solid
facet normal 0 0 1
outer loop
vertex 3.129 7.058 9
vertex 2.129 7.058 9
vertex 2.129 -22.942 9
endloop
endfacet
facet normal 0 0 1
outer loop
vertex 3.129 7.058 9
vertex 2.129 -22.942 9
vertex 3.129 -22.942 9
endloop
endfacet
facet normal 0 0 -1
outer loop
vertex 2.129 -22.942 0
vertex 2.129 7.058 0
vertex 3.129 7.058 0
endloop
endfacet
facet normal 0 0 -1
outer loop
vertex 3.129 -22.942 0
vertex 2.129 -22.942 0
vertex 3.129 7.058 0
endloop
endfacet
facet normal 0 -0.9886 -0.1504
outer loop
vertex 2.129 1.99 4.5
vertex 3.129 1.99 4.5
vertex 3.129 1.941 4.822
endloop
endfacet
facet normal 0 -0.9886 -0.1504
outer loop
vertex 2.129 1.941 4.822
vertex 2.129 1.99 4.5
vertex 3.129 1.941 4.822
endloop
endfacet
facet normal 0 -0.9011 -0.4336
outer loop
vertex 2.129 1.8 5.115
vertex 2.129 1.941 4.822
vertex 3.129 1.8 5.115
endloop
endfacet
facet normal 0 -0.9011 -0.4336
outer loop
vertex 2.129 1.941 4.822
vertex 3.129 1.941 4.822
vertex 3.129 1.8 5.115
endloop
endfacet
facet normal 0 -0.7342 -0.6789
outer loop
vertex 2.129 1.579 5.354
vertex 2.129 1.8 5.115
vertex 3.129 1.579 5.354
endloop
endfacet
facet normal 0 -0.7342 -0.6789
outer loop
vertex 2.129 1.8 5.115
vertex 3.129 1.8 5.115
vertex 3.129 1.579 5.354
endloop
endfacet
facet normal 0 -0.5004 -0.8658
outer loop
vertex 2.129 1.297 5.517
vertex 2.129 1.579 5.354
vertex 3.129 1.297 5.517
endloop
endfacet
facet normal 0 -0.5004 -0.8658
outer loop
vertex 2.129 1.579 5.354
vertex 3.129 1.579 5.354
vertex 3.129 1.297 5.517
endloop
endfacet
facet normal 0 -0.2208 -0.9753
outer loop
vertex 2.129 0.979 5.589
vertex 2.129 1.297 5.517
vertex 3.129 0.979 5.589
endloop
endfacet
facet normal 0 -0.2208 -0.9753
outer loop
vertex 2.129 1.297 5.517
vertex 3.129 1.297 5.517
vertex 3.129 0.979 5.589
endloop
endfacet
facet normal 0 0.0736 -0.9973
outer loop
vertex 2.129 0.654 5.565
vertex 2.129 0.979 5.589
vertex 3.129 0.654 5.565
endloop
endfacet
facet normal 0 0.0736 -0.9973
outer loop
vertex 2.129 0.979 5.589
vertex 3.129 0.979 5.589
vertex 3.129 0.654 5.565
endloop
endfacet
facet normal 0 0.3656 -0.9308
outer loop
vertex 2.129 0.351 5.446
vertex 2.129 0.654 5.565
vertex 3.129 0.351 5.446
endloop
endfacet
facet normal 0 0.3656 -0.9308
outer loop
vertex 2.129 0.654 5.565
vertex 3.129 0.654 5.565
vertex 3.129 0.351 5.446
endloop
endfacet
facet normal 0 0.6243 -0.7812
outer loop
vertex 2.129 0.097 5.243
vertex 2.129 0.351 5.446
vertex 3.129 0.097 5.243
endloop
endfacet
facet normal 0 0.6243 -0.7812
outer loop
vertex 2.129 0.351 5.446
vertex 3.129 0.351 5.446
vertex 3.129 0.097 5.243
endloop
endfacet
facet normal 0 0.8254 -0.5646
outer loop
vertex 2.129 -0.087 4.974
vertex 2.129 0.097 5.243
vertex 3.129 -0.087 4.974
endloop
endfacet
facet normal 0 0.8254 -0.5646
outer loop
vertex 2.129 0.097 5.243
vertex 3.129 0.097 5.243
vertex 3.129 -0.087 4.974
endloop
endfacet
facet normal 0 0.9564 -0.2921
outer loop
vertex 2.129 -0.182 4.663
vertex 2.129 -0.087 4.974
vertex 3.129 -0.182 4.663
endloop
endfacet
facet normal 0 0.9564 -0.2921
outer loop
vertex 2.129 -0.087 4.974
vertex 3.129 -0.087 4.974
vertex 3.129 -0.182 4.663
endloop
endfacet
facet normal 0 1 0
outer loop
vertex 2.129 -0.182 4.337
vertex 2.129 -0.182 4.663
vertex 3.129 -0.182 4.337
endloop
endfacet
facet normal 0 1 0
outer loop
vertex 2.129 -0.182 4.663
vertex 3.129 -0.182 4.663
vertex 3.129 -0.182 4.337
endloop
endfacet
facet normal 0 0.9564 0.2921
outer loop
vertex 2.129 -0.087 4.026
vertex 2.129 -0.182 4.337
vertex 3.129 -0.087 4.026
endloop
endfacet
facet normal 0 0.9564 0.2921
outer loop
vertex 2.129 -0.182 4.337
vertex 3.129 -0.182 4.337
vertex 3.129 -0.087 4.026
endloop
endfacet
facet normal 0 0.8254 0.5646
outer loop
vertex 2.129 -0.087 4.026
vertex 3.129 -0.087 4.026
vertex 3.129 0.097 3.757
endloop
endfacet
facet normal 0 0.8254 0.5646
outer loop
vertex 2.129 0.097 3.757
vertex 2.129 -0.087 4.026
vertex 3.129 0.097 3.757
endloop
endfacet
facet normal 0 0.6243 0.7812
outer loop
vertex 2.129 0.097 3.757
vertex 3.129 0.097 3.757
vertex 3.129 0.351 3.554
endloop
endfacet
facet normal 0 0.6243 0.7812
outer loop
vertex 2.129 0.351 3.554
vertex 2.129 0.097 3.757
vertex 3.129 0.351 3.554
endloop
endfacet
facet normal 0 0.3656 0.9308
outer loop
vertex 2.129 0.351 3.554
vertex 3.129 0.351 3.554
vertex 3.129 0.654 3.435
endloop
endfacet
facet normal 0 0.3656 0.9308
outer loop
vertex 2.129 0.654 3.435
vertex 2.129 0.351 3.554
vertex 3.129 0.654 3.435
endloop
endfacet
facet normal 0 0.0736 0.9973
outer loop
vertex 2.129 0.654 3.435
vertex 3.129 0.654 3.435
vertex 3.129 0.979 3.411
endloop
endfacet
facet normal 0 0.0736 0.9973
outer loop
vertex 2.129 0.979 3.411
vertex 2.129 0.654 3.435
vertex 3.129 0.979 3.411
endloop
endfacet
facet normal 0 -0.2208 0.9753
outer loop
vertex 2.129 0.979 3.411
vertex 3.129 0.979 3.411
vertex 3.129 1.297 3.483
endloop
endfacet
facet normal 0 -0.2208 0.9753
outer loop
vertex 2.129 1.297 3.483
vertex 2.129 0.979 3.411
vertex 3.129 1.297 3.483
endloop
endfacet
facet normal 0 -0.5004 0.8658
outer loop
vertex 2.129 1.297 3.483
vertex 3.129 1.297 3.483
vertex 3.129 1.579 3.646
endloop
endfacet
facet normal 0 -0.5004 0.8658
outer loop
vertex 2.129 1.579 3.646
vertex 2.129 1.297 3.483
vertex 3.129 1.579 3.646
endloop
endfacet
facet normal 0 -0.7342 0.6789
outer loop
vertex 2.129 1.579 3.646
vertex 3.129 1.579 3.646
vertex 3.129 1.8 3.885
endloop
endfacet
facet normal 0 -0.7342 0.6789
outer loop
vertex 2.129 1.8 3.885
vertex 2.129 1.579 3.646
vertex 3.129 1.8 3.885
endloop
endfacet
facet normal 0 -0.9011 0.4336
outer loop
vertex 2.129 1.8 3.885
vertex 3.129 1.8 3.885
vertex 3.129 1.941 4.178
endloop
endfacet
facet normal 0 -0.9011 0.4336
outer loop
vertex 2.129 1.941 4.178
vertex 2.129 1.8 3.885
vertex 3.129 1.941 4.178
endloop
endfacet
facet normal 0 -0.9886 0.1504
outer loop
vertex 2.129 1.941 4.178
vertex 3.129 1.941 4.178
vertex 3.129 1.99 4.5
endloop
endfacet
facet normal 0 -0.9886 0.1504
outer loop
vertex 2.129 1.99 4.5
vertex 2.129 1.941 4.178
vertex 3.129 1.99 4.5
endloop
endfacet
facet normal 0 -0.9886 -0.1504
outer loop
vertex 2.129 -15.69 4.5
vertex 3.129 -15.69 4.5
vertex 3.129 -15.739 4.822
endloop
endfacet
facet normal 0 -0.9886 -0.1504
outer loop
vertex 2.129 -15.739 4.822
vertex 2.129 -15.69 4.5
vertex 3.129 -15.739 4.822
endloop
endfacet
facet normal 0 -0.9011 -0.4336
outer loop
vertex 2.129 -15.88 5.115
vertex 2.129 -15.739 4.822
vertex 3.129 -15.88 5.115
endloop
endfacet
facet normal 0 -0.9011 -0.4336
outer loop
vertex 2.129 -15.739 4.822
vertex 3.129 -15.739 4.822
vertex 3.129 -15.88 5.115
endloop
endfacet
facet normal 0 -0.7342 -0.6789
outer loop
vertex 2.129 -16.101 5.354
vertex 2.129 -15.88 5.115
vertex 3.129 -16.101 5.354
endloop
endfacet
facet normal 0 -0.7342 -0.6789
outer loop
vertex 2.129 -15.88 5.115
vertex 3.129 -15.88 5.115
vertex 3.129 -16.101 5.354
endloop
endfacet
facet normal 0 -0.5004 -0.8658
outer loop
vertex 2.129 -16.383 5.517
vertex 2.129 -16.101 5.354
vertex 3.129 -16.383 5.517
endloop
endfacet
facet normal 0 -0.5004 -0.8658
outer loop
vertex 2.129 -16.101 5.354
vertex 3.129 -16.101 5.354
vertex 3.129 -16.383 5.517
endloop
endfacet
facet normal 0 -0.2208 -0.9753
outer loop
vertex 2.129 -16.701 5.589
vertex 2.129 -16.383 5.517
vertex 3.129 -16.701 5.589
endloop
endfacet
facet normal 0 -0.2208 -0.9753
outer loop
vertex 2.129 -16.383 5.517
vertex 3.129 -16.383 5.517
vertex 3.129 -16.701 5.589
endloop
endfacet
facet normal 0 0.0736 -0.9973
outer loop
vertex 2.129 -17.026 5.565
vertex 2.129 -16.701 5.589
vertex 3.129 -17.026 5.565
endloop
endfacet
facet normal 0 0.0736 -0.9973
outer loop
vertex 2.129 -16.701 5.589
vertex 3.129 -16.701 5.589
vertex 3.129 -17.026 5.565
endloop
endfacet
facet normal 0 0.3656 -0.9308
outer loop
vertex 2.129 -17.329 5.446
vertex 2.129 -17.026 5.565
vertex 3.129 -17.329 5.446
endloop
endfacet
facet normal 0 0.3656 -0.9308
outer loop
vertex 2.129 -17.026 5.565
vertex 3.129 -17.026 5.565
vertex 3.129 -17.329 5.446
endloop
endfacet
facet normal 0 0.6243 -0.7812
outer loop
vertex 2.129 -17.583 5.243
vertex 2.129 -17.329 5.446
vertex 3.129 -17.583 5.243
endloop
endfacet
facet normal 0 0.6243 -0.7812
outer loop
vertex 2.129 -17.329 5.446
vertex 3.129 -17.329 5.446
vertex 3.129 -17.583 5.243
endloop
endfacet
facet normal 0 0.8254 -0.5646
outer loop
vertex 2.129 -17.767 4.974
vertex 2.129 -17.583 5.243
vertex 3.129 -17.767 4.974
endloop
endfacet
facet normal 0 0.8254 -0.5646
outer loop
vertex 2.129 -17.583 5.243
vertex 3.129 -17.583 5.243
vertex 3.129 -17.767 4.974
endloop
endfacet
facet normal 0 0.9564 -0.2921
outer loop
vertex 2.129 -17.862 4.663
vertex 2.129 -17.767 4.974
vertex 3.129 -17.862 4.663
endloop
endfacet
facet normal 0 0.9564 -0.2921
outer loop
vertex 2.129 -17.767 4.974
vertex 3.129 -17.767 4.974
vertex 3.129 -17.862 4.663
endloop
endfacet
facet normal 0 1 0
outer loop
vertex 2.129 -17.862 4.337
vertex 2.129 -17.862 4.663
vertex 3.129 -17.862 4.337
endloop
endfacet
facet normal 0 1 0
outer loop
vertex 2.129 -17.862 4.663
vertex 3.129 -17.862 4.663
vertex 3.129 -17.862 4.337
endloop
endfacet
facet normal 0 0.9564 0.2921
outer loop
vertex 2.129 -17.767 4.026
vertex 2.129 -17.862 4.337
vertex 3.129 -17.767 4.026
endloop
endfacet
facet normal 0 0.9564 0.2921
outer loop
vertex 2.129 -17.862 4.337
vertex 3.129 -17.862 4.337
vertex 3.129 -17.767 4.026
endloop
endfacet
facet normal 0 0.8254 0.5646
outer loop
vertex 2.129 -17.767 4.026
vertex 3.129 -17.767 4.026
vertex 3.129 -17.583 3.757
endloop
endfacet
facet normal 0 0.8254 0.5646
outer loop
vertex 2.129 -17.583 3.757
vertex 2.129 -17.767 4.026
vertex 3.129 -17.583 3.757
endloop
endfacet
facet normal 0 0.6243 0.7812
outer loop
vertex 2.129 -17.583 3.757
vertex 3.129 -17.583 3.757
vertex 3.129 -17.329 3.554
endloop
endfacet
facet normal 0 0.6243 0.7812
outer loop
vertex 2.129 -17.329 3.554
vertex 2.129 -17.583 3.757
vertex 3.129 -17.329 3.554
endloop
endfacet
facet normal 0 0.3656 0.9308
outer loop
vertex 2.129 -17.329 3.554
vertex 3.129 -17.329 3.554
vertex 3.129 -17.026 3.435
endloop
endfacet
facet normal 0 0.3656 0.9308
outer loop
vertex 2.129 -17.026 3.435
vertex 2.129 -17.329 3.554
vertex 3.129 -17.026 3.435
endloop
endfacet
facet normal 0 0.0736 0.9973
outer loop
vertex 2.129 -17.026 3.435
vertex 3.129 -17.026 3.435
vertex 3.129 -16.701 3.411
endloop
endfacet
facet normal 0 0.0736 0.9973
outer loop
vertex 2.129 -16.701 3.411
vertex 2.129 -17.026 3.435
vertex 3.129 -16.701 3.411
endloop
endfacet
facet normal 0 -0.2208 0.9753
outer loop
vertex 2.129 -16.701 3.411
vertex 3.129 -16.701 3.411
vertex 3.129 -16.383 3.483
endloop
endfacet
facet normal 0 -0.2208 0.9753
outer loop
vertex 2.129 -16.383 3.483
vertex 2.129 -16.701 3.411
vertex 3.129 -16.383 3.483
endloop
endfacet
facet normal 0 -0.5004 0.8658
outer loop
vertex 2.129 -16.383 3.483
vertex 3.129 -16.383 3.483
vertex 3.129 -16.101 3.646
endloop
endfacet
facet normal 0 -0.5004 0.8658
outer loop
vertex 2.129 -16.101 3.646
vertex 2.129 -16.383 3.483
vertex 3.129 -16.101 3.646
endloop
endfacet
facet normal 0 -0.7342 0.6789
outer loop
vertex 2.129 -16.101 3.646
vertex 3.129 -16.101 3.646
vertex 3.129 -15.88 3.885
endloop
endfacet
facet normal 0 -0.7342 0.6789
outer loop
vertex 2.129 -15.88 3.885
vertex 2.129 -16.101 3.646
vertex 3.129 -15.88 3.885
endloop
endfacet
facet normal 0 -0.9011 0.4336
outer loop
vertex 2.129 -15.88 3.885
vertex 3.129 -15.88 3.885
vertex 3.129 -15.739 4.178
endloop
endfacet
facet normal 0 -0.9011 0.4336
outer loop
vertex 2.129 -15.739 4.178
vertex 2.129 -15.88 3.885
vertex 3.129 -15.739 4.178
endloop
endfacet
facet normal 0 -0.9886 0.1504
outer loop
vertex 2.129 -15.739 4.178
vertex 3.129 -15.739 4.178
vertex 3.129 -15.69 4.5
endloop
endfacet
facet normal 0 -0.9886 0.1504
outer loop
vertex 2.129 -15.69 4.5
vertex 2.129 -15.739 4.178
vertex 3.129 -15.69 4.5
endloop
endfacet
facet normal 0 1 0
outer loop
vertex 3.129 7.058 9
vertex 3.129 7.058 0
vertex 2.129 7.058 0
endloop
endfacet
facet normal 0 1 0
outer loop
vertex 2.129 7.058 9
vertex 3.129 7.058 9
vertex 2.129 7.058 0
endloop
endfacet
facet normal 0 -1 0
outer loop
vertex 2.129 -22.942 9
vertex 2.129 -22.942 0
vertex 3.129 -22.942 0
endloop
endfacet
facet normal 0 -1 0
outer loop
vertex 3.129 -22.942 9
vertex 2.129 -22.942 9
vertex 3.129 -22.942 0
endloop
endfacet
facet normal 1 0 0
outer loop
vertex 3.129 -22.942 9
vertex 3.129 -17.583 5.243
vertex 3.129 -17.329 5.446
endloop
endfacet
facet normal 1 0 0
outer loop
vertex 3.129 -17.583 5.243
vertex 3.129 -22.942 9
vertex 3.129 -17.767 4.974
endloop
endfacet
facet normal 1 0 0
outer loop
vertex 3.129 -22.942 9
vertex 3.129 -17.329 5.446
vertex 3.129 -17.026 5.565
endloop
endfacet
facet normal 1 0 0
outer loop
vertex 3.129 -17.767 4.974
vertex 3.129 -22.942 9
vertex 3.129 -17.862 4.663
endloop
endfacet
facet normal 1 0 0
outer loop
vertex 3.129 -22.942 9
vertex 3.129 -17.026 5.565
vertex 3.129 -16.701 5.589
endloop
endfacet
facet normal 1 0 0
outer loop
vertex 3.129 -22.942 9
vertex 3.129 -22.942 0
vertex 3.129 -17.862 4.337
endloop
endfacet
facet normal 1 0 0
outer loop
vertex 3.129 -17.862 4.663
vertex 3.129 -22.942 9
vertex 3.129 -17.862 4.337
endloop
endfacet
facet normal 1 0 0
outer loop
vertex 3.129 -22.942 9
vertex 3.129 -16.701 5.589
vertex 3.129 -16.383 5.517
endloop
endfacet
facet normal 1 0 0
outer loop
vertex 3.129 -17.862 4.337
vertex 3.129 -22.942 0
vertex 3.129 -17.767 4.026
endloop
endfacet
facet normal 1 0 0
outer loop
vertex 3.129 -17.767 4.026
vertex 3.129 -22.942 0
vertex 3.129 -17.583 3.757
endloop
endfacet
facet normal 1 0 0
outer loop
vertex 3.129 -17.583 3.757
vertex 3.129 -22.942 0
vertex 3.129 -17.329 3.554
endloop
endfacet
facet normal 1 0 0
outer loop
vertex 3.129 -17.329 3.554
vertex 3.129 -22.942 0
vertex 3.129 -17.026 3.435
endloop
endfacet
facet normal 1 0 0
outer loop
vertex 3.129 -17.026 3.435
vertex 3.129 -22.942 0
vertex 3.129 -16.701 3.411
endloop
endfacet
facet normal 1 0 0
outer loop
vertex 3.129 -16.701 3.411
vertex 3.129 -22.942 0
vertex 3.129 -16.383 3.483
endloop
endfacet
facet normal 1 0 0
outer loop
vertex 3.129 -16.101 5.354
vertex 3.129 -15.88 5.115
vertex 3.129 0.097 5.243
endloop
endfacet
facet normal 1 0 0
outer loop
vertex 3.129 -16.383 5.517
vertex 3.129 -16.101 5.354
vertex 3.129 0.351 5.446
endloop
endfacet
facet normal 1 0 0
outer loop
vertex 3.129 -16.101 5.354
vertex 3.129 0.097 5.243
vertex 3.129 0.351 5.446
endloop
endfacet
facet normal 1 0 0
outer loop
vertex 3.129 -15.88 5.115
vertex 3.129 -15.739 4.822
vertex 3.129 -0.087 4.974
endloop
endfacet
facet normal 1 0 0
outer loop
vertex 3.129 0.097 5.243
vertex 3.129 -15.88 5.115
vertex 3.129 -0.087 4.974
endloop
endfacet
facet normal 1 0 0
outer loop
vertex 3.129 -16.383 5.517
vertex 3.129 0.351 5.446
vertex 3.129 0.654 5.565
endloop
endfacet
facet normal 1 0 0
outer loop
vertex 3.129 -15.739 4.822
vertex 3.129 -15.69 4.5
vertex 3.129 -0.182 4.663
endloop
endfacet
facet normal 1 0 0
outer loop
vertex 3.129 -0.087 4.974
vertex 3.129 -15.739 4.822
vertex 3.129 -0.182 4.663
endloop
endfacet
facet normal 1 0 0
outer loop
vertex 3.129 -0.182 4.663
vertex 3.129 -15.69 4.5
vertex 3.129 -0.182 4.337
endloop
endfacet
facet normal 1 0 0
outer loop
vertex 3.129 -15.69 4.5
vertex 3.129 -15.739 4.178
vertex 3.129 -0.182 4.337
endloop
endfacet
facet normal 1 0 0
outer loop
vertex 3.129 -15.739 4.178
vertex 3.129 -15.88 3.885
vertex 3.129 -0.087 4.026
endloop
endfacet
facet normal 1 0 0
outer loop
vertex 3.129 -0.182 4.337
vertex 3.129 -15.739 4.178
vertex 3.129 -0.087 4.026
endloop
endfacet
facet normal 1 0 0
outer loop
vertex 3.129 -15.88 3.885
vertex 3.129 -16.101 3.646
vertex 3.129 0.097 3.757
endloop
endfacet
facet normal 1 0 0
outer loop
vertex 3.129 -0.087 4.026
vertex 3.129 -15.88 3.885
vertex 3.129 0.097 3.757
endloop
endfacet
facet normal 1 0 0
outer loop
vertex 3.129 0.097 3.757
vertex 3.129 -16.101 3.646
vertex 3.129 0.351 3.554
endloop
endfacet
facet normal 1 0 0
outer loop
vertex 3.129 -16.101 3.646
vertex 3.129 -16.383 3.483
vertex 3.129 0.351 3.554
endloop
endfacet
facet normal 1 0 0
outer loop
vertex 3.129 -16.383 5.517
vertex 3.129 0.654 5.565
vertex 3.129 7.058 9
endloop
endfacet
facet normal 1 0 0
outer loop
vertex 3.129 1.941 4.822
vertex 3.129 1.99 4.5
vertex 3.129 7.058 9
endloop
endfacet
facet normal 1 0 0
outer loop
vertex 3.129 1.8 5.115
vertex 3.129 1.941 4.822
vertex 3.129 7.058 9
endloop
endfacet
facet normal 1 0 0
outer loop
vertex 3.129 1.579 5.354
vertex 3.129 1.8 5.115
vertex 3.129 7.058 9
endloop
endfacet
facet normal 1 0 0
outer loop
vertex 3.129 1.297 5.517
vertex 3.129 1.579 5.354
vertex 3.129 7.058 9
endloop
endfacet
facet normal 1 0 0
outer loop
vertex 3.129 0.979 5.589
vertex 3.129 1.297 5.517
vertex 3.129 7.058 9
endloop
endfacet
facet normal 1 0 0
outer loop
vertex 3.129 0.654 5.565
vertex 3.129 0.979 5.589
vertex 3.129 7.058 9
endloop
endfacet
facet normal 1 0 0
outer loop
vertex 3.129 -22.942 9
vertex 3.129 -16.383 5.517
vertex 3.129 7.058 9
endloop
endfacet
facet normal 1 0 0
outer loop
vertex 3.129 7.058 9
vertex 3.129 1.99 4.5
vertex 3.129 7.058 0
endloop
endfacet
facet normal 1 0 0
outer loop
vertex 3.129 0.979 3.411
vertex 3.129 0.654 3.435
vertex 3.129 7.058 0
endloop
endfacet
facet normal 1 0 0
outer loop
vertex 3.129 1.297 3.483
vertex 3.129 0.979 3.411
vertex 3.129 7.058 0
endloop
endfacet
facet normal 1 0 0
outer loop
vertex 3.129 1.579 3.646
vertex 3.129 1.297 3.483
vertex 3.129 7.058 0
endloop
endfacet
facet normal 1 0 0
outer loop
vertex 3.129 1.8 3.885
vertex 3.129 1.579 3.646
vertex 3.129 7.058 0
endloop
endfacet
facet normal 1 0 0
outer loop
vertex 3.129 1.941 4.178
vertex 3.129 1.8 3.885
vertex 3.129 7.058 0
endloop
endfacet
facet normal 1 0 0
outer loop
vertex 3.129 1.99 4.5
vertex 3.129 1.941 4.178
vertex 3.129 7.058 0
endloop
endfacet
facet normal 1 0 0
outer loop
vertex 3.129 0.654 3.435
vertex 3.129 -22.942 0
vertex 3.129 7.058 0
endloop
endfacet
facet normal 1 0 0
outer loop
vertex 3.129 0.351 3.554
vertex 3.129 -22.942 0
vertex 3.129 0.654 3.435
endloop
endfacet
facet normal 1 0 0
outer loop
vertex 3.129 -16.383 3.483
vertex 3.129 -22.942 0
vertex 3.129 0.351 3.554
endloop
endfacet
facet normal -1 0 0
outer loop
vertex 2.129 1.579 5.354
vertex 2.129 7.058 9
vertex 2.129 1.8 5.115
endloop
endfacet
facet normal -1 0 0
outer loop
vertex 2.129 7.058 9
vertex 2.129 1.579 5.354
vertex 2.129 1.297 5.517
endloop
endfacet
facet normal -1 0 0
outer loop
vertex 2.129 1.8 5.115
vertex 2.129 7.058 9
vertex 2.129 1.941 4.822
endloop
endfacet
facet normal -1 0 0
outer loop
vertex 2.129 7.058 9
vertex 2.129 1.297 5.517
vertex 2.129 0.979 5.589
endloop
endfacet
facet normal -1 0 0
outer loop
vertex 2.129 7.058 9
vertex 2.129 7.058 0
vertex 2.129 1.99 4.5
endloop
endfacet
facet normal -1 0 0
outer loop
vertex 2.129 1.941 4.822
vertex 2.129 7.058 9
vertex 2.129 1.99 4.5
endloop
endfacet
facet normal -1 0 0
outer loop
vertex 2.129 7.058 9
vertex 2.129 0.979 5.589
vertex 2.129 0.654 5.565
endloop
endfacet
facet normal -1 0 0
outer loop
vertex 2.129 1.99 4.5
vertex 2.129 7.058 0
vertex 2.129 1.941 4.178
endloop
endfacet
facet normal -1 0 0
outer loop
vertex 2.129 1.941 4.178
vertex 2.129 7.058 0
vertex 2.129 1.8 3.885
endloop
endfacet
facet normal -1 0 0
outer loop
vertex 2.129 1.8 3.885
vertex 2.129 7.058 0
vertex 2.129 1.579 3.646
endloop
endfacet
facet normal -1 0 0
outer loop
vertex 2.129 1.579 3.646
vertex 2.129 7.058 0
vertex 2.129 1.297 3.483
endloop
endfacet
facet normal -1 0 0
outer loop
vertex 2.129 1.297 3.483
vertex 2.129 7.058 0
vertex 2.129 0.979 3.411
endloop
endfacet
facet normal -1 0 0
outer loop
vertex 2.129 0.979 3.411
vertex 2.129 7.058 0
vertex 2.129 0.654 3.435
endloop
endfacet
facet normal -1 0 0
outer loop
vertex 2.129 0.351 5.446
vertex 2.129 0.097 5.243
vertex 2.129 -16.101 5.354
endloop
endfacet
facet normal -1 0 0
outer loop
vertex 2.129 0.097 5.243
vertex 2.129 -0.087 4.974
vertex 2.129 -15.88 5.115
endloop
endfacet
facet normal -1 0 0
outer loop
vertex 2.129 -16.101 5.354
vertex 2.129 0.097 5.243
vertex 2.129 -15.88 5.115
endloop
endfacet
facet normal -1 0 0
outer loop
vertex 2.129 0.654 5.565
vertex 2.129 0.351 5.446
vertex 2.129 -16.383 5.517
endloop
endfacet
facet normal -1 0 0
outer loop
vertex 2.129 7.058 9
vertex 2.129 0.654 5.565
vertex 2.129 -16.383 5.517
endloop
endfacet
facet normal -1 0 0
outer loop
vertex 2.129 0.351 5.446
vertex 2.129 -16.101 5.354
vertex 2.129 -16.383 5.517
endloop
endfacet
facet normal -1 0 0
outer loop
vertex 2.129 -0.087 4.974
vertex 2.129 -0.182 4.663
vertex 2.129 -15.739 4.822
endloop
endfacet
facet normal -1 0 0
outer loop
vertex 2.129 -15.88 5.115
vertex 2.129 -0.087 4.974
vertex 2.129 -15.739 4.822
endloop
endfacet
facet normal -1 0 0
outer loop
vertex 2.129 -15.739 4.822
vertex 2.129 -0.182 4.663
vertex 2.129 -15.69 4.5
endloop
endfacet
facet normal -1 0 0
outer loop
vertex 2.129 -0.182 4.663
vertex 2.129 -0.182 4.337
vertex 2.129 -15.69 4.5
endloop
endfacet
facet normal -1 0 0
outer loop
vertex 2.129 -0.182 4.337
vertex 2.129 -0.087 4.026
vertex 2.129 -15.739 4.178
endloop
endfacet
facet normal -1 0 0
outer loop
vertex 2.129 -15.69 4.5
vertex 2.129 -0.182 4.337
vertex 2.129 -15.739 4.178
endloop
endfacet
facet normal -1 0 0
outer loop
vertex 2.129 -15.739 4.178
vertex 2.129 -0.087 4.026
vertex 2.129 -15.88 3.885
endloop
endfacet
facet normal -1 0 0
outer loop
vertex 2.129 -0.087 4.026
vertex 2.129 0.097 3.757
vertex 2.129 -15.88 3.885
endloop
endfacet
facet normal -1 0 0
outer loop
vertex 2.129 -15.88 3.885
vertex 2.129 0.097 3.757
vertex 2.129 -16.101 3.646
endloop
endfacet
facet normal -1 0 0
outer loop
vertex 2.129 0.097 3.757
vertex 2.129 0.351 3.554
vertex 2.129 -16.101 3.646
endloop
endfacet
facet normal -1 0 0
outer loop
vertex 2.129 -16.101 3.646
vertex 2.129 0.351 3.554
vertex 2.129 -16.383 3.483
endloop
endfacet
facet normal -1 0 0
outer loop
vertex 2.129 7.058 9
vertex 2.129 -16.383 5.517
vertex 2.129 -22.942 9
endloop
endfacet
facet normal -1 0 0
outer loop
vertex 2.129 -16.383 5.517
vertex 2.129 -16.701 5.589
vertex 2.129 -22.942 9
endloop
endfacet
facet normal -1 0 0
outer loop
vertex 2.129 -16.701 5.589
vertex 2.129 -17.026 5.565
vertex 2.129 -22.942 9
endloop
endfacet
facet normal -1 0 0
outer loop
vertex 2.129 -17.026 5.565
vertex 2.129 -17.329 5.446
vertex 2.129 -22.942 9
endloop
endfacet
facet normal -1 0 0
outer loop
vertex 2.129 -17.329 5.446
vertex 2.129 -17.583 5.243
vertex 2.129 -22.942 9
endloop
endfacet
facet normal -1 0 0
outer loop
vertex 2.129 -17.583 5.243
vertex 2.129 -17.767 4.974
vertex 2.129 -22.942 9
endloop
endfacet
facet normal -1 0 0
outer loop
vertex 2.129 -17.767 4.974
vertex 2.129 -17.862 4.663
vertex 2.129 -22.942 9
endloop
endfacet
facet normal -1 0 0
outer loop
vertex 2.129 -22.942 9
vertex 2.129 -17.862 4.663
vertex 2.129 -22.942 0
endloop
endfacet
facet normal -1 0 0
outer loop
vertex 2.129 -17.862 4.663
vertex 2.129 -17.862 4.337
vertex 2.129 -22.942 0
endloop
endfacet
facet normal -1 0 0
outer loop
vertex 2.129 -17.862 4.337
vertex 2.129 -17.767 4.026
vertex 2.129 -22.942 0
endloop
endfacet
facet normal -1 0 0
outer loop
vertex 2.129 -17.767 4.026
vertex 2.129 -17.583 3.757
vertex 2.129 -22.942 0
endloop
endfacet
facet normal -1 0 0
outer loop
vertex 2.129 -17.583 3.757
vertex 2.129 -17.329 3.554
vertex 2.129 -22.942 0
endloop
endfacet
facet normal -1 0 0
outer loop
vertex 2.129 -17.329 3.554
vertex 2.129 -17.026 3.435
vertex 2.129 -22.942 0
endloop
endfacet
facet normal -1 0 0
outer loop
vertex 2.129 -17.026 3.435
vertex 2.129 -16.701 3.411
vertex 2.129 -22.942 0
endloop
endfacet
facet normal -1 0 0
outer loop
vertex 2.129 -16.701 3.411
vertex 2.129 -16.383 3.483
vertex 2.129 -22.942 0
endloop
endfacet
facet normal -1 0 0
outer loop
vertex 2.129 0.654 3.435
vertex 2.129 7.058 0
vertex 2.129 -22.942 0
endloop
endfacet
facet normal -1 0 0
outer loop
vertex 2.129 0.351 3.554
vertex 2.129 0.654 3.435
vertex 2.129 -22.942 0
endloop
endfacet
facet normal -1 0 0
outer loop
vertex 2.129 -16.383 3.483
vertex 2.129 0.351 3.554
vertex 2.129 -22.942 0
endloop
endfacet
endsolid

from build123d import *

# Parameters (mm, degrees)
BOSS_EXTRUDE1_DEPTH = 9
SKETCH2_R           = 1.0922
CUT_EXTRUDE1_DEPTH  = 10


with BuildPart() as part:
    # Sketch1 → Boss-Extrude1 (new body)
    with BuildSketch(Plane.XY):
        Polygon((3.129243729, 7.05753004), (2.129243729, 7.05753004), (2.129243729, -22.94246996), (3.129243729, -22.94246996), (3.129243729, -4.94246996), align=None)
    extrude(amount=BOSS_EXTRUDE1_DEPTH)

    # Sketch2 → Cut-Extrude1 (cut)
    with BuildSketch(Plane(origin=(3.129243729, 0, 0), x_dir=(0, 0, -1), z_dir=(1, 0, 0))):
        with Locations(Location((-4.5, 0.89753004, 0), (0, 0, 90))):
            Circle(SKETCH2_R)
        with Locations(Location((-4.5, -16.78246996, 0), (0, 0, 90))):
            Circle(SKETCH2_R)
    extrude(amount=-CUT_EXTRUDE1_DEPTH, mode=Mode.SUBTRACT)


solid = part.part
